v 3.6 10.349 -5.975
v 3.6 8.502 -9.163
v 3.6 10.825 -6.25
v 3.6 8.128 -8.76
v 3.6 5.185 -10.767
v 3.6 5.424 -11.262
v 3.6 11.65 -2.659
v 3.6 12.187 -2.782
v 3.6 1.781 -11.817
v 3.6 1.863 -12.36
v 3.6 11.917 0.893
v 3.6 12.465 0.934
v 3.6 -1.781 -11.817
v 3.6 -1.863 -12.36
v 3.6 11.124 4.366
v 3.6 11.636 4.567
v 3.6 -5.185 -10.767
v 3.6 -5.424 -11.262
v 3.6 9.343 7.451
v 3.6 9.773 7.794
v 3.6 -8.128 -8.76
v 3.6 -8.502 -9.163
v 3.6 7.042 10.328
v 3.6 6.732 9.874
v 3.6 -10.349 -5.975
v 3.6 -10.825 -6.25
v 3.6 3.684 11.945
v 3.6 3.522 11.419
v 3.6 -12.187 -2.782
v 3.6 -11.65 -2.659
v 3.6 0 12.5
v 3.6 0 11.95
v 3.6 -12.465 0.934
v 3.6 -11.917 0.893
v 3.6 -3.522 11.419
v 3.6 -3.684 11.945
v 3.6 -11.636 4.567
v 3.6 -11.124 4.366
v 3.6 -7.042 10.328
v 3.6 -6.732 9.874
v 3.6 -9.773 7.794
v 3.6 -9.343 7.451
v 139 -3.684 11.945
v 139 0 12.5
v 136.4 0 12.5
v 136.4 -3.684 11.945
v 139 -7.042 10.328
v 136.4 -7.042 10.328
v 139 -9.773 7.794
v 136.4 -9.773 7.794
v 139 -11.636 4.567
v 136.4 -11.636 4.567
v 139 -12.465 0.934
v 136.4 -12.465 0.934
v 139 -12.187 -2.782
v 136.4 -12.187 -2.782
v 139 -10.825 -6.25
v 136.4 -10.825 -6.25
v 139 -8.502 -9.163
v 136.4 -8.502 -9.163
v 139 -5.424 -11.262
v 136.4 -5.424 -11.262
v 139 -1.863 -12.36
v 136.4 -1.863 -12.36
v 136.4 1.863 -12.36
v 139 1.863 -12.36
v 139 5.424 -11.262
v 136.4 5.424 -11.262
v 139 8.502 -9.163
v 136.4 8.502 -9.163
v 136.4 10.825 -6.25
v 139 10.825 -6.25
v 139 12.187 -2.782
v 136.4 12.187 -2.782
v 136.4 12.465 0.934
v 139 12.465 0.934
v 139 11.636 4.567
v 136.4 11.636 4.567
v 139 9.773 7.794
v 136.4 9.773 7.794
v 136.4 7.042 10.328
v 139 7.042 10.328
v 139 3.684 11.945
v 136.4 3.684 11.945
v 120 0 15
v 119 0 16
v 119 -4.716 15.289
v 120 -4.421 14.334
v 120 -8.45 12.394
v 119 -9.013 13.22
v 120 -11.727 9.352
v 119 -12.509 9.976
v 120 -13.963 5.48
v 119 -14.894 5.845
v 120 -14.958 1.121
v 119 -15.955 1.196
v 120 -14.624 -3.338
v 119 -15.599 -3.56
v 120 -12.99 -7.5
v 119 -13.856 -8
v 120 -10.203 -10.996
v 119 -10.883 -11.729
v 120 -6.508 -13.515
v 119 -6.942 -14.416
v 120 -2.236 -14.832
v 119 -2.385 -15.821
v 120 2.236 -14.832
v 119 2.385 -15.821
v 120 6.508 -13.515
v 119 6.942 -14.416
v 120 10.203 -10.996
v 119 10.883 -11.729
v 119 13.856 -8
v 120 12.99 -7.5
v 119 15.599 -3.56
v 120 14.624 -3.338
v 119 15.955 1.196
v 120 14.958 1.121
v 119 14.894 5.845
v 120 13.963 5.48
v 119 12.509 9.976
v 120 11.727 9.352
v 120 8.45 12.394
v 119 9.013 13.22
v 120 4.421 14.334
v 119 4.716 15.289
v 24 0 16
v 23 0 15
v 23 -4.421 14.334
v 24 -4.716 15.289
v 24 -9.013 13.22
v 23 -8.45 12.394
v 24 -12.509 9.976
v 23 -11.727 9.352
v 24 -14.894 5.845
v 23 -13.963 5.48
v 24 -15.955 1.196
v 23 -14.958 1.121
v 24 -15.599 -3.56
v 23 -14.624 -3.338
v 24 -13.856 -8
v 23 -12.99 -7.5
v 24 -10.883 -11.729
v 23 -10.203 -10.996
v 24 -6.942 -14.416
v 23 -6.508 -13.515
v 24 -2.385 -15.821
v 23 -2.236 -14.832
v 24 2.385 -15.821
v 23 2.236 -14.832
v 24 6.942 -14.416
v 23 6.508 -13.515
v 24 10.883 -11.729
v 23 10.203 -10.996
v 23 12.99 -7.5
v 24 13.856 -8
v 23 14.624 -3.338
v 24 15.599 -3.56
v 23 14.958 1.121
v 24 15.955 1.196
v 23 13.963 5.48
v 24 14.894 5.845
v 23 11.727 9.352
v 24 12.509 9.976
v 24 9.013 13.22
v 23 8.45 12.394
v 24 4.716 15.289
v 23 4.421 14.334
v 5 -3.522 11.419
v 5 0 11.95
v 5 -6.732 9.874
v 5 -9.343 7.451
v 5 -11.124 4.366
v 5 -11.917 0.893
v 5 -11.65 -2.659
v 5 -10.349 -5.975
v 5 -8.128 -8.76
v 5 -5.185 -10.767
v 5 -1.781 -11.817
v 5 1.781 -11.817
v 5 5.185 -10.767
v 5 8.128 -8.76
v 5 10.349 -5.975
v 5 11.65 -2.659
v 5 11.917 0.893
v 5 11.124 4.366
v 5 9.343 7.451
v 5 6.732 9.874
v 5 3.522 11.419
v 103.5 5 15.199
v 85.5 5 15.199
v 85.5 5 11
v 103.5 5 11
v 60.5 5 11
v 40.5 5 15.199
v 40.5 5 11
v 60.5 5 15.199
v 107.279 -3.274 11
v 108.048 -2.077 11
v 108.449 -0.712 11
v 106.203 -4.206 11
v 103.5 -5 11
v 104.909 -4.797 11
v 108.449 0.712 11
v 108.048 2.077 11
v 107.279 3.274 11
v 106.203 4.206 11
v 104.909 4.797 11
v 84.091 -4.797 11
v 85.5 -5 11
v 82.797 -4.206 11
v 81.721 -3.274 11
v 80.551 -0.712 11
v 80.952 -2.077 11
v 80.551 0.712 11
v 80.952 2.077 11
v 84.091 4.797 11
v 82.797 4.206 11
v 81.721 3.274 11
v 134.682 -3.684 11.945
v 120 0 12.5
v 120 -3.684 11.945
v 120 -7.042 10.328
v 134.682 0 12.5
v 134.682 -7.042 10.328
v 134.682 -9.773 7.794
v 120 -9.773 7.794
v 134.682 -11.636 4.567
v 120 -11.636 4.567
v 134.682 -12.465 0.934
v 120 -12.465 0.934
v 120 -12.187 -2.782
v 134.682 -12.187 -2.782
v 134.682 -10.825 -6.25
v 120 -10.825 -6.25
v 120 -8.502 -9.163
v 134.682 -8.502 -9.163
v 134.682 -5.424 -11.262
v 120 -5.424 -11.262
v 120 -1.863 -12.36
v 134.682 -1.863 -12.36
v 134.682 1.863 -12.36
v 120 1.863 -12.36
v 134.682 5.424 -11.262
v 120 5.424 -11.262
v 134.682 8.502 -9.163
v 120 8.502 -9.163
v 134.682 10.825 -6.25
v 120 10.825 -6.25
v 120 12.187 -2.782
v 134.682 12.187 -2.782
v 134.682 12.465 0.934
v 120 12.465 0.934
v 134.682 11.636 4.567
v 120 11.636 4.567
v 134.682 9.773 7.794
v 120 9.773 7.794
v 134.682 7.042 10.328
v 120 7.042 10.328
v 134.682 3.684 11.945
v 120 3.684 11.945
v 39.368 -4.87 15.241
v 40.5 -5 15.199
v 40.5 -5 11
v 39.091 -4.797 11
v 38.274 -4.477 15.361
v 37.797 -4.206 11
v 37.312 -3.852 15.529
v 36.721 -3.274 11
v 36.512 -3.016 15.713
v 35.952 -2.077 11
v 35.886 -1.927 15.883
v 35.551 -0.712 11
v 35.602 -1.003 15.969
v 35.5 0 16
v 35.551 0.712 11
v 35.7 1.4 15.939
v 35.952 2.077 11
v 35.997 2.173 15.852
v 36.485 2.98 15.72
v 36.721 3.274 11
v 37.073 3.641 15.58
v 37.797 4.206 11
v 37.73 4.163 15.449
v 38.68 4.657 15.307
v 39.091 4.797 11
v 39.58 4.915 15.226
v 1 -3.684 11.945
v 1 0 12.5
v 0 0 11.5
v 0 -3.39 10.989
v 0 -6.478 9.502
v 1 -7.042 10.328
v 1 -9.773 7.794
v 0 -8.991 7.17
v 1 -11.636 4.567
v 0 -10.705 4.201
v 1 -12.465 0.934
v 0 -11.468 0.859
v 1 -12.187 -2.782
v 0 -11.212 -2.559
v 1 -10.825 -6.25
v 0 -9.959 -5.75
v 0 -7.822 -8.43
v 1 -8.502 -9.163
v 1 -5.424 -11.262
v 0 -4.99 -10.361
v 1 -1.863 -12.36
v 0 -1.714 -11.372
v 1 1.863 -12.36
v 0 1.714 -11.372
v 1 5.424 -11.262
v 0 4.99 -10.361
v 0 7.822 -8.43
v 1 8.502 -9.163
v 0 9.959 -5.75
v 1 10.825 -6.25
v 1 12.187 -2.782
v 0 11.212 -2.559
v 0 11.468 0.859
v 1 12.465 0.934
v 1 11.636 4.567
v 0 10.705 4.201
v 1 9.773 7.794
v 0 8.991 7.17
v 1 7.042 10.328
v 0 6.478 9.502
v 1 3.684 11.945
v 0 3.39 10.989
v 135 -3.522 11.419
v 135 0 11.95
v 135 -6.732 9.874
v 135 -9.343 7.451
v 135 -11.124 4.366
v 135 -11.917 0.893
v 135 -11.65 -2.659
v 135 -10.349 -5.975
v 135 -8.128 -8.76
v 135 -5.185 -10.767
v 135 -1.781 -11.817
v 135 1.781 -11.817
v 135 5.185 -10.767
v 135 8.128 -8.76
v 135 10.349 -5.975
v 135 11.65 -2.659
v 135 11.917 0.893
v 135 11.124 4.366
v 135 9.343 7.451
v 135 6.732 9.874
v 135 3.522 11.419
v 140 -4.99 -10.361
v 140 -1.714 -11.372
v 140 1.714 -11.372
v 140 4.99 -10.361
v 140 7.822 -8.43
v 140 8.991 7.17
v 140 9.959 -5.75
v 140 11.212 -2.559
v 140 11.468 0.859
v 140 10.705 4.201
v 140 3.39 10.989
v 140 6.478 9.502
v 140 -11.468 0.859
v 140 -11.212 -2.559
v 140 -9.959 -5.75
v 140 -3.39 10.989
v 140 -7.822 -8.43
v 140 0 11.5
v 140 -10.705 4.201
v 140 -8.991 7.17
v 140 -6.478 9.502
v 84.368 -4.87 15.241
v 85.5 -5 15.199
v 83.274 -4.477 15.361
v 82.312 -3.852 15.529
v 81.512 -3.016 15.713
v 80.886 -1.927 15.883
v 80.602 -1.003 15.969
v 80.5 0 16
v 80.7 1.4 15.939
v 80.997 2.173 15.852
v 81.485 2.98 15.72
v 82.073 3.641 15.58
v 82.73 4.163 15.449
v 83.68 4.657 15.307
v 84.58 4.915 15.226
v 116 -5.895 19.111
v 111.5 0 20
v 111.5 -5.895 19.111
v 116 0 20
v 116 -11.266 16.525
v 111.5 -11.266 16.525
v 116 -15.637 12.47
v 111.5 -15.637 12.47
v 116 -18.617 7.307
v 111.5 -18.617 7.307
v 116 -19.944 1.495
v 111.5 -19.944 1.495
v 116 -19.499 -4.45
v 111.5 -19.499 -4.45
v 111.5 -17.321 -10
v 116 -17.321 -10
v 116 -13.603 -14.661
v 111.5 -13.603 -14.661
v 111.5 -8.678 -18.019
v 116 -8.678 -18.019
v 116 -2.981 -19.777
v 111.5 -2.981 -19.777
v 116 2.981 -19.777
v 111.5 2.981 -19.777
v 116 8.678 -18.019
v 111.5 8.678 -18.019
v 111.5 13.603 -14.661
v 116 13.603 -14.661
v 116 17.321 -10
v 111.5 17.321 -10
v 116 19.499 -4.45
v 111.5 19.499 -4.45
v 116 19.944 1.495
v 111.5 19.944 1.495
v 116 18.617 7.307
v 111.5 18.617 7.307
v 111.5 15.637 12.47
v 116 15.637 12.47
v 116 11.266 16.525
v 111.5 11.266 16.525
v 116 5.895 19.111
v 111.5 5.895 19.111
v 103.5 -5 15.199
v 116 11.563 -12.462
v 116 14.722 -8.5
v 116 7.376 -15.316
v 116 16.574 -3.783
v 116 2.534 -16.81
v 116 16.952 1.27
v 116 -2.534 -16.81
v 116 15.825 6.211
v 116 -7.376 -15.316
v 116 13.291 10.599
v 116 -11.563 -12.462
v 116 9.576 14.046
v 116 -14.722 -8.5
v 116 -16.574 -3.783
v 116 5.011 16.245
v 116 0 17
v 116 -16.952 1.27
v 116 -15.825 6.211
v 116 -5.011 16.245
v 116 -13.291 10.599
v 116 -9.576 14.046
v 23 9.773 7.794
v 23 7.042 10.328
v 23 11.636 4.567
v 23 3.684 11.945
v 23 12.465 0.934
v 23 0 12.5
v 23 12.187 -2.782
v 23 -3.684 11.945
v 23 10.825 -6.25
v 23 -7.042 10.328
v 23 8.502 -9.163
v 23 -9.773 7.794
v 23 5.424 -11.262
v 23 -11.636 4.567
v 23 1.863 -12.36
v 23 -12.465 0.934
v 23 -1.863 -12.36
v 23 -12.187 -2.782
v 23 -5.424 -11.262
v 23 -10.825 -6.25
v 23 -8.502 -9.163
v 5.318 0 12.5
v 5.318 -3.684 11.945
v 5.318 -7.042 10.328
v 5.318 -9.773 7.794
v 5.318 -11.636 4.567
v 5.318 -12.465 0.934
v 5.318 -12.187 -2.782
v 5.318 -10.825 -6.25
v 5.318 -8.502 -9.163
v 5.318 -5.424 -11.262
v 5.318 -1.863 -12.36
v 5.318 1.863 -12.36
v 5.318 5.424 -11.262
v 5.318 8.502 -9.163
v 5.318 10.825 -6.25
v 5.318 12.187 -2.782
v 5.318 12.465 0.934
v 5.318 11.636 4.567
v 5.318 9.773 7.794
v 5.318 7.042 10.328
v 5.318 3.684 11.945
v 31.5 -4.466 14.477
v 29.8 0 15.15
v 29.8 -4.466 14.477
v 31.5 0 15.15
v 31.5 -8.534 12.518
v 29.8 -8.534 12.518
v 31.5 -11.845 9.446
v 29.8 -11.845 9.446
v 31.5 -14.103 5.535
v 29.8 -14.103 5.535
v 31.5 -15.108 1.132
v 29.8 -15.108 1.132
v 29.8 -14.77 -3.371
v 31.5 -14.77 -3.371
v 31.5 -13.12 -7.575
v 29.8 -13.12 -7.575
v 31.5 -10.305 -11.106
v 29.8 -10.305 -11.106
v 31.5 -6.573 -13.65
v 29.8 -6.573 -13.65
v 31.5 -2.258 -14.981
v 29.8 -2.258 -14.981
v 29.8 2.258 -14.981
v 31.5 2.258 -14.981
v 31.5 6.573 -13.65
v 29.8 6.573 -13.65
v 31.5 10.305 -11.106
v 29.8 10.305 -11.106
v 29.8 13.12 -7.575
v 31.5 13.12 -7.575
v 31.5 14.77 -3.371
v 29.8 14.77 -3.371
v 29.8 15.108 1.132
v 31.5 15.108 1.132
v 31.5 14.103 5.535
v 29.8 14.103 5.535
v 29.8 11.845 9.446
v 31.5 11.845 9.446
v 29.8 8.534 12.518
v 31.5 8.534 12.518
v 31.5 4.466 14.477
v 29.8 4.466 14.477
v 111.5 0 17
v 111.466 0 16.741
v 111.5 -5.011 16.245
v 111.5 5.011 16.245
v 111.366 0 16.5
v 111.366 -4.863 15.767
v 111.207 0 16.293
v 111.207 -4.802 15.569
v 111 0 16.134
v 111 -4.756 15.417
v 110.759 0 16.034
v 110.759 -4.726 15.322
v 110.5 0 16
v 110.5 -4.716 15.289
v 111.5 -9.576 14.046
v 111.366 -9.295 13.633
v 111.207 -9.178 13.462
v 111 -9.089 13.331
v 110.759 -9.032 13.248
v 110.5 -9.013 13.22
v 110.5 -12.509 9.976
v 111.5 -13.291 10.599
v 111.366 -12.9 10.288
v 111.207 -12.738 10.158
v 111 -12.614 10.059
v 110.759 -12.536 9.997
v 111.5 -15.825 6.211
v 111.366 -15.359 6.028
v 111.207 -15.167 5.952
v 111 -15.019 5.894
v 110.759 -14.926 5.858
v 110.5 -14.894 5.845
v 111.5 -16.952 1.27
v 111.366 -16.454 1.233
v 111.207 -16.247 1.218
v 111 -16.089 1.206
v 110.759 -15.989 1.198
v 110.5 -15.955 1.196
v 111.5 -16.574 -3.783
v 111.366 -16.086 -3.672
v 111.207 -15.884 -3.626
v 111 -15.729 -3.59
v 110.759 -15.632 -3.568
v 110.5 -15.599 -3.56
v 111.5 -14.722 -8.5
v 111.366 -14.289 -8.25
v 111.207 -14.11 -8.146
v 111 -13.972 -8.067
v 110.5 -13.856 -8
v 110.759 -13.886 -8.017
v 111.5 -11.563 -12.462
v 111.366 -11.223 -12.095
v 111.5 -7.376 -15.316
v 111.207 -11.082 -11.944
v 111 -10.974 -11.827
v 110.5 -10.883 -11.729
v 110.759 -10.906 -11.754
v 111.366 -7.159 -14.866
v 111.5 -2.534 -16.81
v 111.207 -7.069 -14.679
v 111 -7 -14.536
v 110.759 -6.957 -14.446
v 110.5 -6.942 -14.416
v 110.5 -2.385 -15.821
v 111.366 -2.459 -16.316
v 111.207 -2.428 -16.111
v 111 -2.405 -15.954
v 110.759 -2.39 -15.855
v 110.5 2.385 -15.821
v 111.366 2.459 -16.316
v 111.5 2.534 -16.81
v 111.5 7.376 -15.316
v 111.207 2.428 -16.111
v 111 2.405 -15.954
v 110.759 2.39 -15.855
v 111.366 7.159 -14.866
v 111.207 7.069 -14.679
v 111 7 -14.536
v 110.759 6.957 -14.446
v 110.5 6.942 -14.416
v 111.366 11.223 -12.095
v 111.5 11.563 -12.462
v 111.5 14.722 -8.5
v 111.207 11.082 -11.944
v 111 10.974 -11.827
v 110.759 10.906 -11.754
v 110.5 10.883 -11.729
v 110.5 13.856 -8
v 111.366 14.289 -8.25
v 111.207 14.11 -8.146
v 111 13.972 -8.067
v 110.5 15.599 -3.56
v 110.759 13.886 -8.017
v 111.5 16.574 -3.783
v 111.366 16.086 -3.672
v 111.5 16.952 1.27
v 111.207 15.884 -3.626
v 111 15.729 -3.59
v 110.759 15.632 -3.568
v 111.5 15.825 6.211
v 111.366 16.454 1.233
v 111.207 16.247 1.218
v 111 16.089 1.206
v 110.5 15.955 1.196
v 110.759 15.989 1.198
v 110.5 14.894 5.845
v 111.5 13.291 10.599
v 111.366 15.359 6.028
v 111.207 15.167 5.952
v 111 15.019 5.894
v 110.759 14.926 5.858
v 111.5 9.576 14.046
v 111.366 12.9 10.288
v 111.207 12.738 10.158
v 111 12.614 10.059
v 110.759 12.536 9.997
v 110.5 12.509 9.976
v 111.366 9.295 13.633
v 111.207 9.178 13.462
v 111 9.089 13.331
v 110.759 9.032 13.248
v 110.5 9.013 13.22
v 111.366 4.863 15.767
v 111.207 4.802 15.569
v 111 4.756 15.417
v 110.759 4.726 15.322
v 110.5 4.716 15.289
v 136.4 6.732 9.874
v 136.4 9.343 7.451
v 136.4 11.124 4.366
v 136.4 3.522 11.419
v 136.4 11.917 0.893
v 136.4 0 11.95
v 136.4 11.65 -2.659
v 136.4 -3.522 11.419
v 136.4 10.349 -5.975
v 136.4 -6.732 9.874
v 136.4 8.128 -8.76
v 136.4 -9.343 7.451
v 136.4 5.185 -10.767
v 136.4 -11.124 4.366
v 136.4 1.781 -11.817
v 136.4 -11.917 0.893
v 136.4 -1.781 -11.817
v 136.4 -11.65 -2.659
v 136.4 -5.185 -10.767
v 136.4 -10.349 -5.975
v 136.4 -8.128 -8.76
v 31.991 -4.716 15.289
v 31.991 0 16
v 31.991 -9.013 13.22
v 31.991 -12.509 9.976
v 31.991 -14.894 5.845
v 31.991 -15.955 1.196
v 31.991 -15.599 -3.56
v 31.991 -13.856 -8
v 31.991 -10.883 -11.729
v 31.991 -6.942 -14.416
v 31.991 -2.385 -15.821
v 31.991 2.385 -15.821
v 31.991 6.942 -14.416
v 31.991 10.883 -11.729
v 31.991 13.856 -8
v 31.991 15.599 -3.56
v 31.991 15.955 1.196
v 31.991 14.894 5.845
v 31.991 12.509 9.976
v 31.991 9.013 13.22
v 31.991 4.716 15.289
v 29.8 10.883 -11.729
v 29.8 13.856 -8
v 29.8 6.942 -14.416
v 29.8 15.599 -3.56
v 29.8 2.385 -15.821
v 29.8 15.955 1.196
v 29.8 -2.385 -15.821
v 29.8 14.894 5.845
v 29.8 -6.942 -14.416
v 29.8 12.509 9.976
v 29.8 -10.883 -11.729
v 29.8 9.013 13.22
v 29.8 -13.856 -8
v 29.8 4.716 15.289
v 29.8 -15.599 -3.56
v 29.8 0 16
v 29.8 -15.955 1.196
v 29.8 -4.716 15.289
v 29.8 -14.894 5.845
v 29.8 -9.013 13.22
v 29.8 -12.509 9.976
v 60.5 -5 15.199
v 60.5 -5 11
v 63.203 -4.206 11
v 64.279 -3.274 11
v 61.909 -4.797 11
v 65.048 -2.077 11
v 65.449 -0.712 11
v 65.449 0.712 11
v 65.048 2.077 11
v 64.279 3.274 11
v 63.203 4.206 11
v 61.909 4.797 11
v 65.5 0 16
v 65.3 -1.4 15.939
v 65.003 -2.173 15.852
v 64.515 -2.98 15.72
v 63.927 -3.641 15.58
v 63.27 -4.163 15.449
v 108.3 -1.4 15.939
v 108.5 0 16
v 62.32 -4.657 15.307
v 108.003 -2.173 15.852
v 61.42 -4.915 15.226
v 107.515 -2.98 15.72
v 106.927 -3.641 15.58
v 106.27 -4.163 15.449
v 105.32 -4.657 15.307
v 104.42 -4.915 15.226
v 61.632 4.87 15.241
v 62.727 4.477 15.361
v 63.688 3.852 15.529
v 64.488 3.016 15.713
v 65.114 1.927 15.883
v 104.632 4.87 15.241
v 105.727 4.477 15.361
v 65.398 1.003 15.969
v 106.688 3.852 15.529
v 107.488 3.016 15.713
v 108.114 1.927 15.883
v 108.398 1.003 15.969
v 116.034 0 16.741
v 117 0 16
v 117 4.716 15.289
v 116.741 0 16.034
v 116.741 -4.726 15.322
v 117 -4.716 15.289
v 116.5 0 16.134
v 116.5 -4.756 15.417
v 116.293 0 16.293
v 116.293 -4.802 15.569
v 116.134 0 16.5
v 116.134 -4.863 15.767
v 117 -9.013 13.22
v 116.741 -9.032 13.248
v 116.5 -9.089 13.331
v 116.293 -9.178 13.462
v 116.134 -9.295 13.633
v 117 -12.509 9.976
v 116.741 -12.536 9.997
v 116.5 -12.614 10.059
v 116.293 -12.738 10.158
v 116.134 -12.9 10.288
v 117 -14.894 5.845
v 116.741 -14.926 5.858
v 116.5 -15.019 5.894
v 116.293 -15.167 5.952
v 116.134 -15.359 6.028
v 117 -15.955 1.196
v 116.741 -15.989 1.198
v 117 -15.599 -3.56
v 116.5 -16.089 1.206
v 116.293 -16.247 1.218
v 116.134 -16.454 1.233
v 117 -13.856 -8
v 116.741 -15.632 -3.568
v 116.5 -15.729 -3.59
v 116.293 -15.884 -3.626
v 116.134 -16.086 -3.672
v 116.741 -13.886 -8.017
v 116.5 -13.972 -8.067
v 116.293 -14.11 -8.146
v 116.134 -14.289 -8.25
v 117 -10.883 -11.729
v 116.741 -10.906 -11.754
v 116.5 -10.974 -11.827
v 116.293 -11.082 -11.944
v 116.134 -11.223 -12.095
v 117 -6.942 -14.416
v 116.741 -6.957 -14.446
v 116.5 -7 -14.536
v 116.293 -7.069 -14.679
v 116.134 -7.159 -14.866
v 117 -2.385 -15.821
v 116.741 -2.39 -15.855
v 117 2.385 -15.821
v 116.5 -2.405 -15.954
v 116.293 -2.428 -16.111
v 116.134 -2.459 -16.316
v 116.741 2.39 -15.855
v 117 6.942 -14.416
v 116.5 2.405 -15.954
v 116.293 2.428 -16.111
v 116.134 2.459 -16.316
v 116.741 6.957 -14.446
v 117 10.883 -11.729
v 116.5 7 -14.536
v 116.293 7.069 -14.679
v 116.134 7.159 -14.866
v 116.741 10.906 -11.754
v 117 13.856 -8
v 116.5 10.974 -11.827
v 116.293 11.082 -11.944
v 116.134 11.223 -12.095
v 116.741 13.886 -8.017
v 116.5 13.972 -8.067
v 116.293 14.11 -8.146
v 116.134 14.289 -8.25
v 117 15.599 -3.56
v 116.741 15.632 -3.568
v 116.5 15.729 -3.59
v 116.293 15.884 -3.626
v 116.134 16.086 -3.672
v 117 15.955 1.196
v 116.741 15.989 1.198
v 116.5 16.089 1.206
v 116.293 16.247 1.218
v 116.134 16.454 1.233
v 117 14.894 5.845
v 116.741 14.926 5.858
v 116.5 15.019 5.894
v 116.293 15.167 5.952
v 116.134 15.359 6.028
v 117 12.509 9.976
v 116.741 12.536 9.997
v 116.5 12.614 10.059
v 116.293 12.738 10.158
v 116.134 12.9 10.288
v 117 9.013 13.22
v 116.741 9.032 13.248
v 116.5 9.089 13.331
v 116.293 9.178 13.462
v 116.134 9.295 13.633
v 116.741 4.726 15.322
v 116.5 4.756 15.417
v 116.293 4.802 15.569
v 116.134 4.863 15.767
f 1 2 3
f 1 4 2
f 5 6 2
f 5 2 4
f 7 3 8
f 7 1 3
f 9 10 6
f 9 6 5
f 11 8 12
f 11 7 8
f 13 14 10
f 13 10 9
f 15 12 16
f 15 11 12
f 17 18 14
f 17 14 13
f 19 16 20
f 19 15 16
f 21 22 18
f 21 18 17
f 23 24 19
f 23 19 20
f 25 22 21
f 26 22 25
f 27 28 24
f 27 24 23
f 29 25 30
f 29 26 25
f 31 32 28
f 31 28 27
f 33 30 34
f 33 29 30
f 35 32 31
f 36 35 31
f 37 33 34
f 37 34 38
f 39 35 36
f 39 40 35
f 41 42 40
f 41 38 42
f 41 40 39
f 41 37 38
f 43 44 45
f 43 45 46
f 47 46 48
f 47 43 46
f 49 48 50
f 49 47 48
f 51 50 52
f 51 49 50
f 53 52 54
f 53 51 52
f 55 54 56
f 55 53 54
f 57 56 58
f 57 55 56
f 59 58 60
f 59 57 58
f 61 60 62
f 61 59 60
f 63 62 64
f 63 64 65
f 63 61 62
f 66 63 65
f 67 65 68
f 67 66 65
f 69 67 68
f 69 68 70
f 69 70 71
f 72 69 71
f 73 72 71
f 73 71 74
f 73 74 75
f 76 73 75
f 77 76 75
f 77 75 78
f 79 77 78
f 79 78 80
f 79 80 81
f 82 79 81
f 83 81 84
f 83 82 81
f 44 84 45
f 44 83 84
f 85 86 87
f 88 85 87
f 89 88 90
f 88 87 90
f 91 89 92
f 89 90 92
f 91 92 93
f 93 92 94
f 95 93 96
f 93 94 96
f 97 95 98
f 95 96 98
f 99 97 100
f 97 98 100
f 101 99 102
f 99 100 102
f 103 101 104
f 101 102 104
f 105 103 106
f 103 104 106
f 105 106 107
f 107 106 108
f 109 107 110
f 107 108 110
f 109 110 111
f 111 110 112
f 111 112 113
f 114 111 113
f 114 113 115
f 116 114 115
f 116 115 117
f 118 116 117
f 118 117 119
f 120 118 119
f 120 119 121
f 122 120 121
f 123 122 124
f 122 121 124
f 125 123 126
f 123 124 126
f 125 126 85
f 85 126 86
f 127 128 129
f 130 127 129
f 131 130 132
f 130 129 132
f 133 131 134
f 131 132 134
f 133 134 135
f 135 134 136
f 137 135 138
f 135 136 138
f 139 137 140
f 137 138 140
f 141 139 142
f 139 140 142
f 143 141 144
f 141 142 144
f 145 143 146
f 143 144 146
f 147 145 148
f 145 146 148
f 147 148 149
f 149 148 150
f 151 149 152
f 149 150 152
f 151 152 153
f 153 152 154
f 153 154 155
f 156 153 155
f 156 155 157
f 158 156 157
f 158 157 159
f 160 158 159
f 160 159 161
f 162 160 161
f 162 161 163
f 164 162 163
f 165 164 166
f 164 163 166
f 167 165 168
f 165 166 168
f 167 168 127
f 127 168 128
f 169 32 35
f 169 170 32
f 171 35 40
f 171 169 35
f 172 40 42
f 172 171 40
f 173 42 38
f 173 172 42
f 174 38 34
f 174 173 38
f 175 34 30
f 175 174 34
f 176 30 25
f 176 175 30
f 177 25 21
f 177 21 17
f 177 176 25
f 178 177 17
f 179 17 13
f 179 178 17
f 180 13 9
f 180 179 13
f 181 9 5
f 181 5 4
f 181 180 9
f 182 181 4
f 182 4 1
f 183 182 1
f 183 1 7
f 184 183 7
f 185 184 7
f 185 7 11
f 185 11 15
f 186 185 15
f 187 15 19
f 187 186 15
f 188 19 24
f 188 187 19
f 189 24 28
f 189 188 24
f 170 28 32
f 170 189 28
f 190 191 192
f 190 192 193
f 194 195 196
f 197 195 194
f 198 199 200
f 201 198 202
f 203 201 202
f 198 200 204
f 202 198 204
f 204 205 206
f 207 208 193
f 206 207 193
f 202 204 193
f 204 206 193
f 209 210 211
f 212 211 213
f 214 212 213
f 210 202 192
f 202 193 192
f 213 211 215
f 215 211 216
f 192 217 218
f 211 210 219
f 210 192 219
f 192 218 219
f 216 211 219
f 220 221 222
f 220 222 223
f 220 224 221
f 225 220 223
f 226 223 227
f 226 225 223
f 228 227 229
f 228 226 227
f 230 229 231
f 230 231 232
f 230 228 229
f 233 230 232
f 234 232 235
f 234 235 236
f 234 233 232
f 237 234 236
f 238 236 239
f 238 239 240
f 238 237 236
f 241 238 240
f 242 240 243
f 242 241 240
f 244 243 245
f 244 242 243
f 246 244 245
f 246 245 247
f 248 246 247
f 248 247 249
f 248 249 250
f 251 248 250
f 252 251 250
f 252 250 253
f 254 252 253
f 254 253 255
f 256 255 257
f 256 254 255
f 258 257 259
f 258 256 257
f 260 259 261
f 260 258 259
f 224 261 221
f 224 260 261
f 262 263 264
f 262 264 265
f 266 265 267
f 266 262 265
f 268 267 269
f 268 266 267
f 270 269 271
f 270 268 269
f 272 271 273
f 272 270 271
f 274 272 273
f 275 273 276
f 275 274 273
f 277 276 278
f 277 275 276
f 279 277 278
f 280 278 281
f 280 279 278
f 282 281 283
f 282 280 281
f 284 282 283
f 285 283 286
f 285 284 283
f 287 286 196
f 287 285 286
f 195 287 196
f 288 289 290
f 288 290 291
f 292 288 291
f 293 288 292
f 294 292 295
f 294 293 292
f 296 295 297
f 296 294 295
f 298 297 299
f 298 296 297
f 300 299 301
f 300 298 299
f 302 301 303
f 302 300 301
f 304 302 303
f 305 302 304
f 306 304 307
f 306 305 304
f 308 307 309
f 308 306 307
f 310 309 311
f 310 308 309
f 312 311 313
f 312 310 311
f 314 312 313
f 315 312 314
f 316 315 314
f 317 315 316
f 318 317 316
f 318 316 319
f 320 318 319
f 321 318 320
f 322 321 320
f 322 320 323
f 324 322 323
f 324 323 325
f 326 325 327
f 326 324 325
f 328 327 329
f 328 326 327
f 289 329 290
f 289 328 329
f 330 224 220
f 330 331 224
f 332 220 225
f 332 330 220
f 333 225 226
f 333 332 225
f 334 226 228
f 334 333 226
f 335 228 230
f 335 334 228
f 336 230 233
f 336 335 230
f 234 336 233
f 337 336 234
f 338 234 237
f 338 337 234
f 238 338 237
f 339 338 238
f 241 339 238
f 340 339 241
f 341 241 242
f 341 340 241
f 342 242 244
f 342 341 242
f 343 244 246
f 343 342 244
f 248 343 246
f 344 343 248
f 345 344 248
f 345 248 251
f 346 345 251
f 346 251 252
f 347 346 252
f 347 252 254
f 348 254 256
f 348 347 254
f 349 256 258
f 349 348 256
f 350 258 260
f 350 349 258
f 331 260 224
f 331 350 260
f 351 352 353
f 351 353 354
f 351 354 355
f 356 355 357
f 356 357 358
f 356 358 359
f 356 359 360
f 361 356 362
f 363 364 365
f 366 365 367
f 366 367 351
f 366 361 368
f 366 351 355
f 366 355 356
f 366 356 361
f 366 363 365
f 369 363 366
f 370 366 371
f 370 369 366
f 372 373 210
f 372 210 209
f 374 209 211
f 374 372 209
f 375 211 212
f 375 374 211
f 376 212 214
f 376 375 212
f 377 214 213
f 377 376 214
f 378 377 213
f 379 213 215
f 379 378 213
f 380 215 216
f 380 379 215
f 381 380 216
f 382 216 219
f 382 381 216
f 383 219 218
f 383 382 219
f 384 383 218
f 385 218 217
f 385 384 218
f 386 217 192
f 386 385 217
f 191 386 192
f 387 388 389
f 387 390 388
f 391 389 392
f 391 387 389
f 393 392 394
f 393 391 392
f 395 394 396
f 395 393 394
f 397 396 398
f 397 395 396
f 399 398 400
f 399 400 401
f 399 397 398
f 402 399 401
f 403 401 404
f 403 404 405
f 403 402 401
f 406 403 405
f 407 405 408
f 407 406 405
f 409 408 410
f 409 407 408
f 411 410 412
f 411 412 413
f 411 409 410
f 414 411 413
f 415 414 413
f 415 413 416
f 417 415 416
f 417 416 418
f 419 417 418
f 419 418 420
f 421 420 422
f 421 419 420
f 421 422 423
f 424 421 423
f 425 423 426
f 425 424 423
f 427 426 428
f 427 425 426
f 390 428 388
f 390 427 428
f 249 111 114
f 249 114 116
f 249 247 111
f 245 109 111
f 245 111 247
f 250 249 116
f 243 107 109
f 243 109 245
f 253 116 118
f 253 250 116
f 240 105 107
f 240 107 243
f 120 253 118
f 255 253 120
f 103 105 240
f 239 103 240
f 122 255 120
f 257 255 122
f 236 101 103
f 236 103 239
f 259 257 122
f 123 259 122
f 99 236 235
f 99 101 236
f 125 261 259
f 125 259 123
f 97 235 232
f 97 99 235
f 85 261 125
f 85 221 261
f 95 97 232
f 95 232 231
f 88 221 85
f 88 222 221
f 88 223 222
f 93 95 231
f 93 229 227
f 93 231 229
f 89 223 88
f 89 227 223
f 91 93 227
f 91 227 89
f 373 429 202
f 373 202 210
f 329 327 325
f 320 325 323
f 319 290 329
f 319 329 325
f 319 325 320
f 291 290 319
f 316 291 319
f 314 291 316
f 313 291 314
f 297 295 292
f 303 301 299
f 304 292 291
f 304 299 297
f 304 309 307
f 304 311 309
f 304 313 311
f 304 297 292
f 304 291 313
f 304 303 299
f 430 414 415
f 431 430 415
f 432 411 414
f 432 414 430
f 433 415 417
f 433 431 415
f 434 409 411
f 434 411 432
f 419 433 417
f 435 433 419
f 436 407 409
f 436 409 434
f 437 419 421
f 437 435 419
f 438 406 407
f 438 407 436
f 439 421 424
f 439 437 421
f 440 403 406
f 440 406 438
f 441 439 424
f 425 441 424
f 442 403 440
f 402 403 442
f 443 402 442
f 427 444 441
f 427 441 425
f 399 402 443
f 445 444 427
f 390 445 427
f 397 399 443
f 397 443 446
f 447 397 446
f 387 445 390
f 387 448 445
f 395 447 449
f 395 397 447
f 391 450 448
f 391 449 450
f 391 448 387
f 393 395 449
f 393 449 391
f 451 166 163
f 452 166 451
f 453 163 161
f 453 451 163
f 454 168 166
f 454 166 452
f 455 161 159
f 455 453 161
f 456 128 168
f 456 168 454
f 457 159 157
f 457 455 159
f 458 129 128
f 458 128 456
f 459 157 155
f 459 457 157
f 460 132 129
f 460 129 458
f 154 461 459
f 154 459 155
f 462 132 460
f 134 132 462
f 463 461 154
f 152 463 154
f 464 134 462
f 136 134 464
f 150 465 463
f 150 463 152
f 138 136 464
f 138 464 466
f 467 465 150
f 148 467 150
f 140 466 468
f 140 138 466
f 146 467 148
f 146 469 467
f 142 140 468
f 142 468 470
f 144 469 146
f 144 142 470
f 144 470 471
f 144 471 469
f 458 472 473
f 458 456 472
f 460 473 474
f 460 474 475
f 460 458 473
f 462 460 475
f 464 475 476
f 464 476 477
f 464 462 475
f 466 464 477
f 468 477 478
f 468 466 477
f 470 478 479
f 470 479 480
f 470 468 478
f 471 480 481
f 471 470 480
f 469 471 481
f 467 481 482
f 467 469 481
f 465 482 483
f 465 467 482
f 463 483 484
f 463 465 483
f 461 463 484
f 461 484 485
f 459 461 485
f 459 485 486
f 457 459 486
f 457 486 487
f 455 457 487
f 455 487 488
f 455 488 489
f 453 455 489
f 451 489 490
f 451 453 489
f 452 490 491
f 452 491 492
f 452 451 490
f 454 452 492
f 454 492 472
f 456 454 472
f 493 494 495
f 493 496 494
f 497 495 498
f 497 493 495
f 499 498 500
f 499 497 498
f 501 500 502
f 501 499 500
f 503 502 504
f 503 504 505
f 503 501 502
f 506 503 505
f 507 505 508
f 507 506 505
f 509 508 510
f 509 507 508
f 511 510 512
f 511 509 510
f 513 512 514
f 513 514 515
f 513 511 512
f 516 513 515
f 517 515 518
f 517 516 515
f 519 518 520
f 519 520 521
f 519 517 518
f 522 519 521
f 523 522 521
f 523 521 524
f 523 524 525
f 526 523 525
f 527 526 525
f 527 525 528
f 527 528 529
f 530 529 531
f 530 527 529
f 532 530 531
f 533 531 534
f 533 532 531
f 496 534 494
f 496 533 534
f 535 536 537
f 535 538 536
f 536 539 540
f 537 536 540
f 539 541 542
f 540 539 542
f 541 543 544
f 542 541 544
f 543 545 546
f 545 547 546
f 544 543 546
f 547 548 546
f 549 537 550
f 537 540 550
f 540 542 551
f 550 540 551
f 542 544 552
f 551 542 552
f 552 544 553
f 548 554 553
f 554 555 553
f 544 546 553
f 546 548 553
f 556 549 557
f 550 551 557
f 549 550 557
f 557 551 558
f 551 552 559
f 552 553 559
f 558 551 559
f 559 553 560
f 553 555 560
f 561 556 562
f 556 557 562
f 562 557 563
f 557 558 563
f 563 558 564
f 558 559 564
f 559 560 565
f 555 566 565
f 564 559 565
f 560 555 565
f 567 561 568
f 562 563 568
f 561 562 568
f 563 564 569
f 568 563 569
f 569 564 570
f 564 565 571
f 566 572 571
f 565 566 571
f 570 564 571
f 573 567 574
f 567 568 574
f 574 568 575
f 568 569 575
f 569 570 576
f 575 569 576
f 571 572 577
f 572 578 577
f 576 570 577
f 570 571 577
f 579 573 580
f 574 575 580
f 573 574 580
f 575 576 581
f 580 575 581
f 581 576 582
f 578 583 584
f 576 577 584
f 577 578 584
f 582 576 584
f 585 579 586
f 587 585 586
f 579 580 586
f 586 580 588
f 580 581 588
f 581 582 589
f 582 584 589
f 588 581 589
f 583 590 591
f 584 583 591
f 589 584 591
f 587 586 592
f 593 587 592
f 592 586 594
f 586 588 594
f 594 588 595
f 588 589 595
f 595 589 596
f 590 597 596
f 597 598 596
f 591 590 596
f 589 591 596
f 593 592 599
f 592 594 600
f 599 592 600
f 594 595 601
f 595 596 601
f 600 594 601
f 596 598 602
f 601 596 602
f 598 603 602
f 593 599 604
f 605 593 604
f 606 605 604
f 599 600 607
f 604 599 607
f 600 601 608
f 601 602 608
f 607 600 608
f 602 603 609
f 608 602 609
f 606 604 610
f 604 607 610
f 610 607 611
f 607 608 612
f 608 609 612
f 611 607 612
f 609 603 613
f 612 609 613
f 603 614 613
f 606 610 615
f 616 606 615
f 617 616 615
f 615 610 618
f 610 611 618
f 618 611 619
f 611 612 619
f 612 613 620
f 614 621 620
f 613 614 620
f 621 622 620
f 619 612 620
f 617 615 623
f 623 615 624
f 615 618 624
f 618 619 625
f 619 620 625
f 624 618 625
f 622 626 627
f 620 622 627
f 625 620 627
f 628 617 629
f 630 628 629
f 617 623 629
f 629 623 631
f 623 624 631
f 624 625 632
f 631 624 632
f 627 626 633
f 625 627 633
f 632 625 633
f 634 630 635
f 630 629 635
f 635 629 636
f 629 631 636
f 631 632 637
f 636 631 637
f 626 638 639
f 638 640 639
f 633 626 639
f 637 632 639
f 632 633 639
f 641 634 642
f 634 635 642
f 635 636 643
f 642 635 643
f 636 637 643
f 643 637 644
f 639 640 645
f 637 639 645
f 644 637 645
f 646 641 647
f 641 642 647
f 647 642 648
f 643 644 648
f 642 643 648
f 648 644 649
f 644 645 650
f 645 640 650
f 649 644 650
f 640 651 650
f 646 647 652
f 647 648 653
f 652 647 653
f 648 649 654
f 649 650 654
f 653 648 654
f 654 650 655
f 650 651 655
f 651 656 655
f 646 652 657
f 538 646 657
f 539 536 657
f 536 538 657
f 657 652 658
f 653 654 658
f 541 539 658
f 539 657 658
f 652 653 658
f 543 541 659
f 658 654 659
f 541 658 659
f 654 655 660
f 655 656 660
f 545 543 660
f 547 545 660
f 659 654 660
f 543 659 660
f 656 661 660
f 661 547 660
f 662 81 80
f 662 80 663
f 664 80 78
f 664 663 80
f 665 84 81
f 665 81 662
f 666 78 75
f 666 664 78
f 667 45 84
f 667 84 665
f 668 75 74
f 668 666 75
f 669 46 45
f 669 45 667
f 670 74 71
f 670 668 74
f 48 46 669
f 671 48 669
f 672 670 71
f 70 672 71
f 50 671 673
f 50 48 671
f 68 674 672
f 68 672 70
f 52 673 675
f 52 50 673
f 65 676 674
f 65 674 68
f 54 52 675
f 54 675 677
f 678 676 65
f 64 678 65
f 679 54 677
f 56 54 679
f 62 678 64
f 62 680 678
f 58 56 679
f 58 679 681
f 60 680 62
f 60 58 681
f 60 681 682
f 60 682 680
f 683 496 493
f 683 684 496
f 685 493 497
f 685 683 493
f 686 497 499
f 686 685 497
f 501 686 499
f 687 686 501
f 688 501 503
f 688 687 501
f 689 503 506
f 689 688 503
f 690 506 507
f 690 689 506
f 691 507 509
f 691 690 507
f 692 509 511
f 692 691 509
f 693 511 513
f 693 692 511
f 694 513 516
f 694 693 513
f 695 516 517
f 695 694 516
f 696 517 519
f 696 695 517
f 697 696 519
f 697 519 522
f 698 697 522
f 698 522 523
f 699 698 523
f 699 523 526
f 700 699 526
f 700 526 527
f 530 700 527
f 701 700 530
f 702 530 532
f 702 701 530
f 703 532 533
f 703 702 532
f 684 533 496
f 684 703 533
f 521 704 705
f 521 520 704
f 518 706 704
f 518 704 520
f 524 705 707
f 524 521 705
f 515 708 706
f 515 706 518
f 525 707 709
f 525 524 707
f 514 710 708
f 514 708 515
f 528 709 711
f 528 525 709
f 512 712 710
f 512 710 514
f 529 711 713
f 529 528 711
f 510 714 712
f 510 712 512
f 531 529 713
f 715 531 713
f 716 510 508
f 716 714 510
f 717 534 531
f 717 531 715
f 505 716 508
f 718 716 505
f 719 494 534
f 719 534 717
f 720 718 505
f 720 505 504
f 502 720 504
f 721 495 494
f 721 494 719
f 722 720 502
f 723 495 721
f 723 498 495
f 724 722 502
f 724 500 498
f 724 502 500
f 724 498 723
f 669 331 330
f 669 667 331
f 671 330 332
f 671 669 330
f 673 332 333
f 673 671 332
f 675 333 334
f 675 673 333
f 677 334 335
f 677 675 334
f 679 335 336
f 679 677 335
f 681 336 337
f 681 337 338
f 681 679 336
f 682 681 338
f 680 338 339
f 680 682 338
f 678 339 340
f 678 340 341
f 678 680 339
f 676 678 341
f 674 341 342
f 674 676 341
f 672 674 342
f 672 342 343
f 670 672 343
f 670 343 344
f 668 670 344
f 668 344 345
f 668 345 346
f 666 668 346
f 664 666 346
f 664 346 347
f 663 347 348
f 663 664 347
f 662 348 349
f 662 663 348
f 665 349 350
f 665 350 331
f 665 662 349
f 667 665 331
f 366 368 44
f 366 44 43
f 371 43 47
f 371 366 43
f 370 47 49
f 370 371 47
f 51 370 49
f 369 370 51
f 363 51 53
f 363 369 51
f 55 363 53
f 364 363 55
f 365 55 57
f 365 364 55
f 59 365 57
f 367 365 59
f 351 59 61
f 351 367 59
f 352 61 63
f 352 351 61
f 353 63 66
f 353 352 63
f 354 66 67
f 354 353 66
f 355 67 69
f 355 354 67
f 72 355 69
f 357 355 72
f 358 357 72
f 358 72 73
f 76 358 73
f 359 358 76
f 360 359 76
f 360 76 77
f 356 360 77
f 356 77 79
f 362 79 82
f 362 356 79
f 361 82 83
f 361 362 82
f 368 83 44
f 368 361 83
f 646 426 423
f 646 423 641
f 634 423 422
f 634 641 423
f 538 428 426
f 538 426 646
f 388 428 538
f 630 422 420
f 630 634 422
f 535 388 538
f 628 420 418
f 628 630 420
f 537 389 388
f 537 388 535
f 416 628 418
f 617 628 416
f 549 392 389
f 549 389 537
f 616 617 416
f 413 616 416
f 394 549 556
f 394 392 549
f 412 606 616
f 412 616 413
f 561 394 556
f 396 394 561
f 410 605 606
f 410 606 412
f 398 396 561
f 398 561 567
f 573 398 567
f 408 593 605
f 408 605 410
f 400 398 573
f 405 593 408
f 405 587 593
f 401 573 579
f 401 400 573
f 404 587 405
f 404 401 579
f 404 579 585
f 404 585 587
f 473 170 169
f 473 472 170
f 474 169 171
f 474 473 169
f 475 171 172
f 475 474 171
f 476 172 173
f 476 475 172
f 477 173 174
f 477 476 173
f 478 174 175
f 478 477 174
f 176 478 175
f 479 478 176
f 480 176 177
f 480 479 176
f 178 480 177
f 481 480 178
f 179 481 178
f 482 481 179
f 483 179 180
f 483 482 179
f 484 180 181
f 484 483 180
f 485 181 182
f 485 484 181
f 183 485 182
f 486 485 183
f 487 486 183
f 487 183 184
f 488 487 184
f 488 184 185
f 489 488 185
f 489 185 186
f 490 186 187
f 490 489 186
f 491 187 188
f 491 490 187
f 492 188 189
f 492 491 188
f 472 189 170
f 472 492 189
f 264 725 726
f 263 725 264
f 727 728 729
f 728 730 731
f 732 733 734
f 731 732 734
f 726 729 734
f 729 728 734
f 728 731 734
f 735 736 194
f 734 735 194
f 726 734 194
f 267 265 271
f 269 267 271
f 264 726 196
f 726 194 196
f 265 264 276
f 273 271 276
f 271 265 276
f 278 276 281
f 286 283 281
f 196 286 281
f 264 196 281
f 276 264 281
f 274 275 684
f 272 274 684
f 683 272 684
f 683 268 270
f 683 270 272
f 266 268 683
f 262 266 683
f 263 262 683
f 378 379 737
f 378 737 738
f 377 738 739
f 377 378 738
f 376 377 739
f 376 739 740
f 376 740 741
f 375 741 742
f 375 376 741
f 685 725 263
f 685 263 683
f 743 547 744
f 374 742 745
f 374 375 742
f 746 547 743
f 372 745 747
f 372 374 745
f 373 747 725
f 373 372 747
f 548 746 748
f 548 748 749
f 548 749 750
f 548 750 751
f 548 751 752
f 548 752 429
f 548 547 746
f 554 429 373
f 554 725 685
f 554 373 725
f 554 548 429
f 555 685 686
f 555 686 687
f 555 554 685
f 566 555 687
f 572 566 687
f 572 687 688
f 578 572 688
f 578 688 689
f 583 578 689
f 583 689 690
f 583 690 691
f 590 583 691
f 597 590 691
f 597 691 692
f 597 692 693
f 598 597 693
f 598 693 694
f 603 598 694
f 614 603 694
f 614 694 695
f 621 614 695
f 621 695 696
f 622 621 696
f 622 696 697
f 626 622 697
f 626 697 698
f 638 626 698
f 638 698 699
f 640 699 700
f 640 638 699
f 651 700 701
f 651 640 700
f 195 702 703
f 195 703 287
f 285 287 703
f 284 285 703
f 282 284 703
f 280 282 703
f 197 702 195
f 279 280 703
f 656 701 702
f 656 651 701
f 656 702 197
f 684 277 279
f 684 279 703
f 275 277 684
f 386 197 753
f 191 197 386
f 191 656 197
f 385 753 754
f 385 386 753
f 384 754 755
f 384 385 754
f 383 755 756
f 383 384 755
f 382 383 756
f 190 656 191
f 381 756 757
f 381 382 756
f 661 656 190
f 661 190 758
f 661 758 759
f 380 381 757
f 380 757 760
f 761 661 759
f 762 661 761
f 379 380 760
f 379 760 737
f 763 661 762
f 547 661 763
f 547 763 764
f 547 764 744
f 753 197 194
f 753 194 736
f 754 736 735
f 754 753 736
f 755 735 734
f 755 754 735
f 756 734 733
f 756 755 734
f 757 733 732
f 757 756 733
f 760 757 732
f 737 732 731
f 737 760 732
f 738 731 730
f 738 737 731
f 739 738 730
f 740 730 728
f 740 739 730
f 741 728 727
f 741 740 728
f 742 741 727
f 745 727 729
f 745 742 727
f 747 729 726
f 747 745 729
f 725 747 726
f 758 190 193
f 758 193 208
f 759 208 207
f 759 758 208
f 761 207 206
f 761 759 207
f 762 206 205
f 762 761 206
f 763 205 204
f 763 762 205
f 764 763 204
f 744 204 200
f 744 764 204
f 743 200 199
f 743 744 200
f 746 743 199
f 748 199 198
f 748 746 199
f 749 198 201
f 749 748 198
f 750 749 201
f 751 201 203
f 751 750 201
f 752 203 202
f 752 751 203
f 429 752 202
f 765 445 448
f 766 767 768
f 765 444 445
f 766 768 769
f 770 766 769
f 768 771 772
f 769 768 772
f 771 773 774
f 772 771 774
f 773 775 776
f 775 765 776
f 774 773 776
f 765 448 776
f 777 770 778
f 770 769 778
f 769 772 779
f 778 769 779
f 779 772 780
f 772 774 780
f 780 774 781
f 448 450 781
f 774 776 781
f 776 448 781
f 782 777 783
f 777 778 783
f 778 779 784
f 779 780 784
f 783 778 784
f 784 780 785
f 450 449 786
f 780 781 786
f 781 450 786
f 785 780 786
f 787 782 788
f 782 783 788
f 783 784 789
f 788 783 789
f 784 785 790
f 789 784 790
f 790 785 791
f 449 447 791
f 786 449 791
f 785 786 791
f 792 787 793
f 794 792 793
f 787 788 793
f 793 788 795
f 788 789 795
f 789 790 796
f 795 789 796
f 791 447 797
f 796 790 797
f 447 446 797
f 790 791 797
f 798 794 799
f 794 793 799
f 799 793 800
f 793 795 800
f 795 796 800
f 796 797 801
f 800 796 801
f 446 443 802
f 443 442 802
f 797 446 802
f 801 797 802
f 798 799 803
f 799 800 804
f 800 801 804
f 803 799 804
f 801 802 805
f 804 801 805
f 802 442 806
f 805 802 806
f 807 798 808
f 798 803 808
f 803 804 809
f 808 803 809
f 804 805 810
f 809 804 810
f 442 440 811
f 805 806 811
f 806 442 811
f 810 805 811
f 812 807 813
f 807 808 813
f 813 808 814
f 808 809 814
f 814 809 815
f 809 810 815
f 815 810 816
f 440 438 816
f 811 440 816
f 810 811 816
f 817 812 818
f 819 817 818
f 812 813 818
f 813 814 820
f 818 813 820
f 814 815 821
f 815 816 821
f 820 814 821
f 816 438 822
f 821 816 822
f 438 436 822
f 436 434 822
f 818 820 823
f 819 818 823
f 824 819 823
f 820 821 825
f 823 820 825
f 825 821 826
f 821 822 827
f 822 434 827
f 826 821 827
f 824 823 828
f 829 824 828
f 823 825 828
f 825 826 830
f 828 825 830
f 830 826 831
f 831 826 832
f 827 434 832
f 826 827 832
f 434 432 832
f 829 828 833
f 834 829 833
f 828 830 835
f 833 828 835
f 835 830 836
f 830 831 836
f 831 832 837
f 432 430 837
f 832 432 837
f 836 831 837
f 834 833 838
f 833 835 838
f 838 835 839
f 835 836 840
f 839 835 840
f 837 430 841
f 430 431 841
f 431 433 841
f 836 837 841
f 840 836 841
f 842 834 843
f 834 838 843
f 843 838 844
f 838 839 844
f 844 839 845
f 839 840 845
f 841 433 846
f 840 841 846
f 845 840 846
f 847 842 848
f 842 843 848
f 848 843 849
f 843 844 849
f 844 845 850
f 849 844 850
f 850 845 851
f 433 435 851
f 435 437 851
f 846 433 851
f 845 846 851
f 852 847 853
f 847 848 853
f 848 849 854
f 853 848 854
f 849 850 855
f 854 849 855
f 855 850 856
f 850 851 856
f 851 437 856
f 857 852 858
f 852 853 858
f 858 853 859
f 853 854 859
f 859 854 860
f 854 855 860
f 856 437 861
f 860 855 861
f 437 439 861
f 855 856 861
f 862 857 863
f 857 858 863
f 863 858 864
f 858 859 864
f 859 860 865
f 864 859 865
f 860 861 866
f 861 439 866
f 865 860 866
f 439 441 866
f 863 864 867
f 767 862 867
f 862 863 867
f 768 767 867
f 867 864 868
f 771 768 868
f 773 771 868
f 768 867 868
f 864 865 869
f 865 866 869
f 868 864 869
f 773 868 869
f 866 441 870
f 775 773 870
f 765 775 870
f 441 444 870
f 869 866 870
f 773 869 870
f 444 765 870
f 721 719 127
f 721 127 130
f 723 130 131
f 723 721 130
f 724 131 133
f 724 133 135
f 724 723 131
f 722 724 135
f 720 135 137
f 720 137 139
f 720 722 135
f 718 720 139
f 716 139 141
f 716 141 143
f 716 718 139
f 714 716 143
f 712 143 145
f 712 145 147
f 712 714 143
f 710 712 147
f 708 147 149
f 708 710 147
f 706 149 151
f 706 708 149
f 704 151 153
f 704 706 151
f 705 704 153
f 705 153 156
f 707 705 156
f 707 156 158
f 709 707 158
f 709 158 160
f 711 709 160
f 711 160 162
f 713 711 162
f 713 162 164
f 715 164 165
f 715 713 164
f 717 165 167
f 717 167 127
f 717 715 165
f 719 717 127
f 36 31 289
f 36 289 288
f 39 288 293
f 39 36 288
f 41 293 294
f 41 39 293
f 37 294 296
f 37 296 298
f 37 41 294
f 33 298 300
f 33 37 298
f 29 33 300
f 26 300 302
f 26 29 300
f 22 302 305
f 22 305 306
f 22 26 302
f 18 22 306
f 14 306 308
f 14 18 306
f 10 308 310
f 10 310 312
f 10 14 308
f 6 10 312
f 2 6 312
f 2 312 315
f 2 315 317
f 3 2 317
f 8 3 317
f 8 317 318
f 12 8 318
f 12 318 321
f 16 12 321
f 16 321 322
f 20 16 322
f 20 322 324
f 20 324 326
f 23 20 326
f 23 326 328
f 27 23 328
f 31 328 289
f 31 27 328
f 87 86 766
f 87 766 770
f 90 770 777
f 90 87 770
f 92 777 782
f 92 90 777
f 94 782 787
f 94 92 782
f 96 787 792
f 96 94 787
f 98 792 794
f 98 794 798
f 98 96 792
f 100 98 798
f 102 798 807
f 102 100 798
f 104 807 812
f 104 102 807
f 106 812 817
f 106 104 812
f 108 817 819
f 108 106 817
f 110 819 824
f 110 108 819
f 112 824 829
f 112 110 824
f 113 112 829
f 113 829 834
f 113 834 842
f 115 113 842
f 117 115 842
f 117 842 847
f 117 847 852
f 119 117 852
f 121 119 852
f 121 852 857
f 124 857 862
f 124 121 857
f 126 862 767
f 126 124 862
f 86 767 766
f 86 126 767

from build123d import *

# Parameters (mm, degrees)
TAGLIO_ESTRUSIONE1_DEPTH = 5
SMUSSO1_SIZE             = 1
SMUSSO2_SIZE             = 1
SMUSSO3_SIZE             = 1
RACCORDO3_R              = 1


with BuildPart() as part:
    # Schizzo1 → Rivoluzione1 (revolve)
    with BuildSketch(Plane.XY, mode=Mode.PRIVATE) as rivoluzione1_sk:
        Polygon((0, 0), (0, 12.5), (3.6, 12.5), (3.6, 11.95), (5, 11.95), (5.317542648, 12.5), (23, 12.5), (23, 16), (29.8, 16), (29.8, 15.15), (31.5, 15.15), (31.990747729, 16), (111.5, 16), (111.5, 20), (116, 20), (116, 16), (120, 16), (120, 12.5), (134.682457352, 12.5), (135, 11.95), (136.4, 11.95), (136.4, 12.5), (140, 12.5), (140, 0), align=None)
    revolve(rivoluzione1_sk.sketch.rotate(Axis((0, 0, 0), (1, 0, 0)), 90), axis=Axis((0, 0, 0), (1, 0, 0)))

    # Schizzo2 → Taglio-Estrusione1 (cut)
    with BuildSketch(Plane.XY.offset(16)):
        with BuildLine():
            Line((40.5, 5), (60.5, 5))
            ThreePointArc((60.5, 5), (65.5, 0), (60.5, -5))
            Line((60.5, -5), (40.5, -5))
            ThreePointArc((40.5, -5), (35.5, 0), (40.5, 5))
        make_face()
        with BuildLine():
            Line((85.5, 5), (103.5, 5))
            ThreePointArc((103.5, 5), (108.5, 0), (103.5, -5))
            Line((103.5, -5), (85.5, -5))
            ThreePointArc((85.5, -5), (80.5, 0), (85.5, 5))
        make_face()
    extrude(amount=-TAGLIO_ESTRUSIONE1_DEPTH, mode=Mode.SUBTRACT)

    # Smusso1
    smusso1_edges = [part.edges().sort_by_distance(p)[0] for p in [
        (0, 0, -12.5),
    ]]
    chamfer(smusso1_edges, length=SMUSSO1_SIZE)

    # Smusso2
    smusso2_edges = [part.edges().sort_by_distance(p)[0] for p in [
        (140, 0, -12.5),
    ]]
    chamfer(smusso2_edges, length=SMUSSO2_SIZE)

    # Smusso3
    smusso3_edges = [part.edges().sort_by_distance(p)[0] for p in [
        (120, 0, -16),
        (23, 0, -16),
    ]]
    chamfer(smusso3_edges, length=SMUSSO3_SIZE)

    # Raccordo3
    raccordo3_edges = [part.edges().sort_by_distance(p)[0] for p in [
        (116, 0, -16),
        (111.5, 0, -16),
    ]]
    fillet(raccordo3_edges, radius=RACCORDO3_R)


solid = part.part
